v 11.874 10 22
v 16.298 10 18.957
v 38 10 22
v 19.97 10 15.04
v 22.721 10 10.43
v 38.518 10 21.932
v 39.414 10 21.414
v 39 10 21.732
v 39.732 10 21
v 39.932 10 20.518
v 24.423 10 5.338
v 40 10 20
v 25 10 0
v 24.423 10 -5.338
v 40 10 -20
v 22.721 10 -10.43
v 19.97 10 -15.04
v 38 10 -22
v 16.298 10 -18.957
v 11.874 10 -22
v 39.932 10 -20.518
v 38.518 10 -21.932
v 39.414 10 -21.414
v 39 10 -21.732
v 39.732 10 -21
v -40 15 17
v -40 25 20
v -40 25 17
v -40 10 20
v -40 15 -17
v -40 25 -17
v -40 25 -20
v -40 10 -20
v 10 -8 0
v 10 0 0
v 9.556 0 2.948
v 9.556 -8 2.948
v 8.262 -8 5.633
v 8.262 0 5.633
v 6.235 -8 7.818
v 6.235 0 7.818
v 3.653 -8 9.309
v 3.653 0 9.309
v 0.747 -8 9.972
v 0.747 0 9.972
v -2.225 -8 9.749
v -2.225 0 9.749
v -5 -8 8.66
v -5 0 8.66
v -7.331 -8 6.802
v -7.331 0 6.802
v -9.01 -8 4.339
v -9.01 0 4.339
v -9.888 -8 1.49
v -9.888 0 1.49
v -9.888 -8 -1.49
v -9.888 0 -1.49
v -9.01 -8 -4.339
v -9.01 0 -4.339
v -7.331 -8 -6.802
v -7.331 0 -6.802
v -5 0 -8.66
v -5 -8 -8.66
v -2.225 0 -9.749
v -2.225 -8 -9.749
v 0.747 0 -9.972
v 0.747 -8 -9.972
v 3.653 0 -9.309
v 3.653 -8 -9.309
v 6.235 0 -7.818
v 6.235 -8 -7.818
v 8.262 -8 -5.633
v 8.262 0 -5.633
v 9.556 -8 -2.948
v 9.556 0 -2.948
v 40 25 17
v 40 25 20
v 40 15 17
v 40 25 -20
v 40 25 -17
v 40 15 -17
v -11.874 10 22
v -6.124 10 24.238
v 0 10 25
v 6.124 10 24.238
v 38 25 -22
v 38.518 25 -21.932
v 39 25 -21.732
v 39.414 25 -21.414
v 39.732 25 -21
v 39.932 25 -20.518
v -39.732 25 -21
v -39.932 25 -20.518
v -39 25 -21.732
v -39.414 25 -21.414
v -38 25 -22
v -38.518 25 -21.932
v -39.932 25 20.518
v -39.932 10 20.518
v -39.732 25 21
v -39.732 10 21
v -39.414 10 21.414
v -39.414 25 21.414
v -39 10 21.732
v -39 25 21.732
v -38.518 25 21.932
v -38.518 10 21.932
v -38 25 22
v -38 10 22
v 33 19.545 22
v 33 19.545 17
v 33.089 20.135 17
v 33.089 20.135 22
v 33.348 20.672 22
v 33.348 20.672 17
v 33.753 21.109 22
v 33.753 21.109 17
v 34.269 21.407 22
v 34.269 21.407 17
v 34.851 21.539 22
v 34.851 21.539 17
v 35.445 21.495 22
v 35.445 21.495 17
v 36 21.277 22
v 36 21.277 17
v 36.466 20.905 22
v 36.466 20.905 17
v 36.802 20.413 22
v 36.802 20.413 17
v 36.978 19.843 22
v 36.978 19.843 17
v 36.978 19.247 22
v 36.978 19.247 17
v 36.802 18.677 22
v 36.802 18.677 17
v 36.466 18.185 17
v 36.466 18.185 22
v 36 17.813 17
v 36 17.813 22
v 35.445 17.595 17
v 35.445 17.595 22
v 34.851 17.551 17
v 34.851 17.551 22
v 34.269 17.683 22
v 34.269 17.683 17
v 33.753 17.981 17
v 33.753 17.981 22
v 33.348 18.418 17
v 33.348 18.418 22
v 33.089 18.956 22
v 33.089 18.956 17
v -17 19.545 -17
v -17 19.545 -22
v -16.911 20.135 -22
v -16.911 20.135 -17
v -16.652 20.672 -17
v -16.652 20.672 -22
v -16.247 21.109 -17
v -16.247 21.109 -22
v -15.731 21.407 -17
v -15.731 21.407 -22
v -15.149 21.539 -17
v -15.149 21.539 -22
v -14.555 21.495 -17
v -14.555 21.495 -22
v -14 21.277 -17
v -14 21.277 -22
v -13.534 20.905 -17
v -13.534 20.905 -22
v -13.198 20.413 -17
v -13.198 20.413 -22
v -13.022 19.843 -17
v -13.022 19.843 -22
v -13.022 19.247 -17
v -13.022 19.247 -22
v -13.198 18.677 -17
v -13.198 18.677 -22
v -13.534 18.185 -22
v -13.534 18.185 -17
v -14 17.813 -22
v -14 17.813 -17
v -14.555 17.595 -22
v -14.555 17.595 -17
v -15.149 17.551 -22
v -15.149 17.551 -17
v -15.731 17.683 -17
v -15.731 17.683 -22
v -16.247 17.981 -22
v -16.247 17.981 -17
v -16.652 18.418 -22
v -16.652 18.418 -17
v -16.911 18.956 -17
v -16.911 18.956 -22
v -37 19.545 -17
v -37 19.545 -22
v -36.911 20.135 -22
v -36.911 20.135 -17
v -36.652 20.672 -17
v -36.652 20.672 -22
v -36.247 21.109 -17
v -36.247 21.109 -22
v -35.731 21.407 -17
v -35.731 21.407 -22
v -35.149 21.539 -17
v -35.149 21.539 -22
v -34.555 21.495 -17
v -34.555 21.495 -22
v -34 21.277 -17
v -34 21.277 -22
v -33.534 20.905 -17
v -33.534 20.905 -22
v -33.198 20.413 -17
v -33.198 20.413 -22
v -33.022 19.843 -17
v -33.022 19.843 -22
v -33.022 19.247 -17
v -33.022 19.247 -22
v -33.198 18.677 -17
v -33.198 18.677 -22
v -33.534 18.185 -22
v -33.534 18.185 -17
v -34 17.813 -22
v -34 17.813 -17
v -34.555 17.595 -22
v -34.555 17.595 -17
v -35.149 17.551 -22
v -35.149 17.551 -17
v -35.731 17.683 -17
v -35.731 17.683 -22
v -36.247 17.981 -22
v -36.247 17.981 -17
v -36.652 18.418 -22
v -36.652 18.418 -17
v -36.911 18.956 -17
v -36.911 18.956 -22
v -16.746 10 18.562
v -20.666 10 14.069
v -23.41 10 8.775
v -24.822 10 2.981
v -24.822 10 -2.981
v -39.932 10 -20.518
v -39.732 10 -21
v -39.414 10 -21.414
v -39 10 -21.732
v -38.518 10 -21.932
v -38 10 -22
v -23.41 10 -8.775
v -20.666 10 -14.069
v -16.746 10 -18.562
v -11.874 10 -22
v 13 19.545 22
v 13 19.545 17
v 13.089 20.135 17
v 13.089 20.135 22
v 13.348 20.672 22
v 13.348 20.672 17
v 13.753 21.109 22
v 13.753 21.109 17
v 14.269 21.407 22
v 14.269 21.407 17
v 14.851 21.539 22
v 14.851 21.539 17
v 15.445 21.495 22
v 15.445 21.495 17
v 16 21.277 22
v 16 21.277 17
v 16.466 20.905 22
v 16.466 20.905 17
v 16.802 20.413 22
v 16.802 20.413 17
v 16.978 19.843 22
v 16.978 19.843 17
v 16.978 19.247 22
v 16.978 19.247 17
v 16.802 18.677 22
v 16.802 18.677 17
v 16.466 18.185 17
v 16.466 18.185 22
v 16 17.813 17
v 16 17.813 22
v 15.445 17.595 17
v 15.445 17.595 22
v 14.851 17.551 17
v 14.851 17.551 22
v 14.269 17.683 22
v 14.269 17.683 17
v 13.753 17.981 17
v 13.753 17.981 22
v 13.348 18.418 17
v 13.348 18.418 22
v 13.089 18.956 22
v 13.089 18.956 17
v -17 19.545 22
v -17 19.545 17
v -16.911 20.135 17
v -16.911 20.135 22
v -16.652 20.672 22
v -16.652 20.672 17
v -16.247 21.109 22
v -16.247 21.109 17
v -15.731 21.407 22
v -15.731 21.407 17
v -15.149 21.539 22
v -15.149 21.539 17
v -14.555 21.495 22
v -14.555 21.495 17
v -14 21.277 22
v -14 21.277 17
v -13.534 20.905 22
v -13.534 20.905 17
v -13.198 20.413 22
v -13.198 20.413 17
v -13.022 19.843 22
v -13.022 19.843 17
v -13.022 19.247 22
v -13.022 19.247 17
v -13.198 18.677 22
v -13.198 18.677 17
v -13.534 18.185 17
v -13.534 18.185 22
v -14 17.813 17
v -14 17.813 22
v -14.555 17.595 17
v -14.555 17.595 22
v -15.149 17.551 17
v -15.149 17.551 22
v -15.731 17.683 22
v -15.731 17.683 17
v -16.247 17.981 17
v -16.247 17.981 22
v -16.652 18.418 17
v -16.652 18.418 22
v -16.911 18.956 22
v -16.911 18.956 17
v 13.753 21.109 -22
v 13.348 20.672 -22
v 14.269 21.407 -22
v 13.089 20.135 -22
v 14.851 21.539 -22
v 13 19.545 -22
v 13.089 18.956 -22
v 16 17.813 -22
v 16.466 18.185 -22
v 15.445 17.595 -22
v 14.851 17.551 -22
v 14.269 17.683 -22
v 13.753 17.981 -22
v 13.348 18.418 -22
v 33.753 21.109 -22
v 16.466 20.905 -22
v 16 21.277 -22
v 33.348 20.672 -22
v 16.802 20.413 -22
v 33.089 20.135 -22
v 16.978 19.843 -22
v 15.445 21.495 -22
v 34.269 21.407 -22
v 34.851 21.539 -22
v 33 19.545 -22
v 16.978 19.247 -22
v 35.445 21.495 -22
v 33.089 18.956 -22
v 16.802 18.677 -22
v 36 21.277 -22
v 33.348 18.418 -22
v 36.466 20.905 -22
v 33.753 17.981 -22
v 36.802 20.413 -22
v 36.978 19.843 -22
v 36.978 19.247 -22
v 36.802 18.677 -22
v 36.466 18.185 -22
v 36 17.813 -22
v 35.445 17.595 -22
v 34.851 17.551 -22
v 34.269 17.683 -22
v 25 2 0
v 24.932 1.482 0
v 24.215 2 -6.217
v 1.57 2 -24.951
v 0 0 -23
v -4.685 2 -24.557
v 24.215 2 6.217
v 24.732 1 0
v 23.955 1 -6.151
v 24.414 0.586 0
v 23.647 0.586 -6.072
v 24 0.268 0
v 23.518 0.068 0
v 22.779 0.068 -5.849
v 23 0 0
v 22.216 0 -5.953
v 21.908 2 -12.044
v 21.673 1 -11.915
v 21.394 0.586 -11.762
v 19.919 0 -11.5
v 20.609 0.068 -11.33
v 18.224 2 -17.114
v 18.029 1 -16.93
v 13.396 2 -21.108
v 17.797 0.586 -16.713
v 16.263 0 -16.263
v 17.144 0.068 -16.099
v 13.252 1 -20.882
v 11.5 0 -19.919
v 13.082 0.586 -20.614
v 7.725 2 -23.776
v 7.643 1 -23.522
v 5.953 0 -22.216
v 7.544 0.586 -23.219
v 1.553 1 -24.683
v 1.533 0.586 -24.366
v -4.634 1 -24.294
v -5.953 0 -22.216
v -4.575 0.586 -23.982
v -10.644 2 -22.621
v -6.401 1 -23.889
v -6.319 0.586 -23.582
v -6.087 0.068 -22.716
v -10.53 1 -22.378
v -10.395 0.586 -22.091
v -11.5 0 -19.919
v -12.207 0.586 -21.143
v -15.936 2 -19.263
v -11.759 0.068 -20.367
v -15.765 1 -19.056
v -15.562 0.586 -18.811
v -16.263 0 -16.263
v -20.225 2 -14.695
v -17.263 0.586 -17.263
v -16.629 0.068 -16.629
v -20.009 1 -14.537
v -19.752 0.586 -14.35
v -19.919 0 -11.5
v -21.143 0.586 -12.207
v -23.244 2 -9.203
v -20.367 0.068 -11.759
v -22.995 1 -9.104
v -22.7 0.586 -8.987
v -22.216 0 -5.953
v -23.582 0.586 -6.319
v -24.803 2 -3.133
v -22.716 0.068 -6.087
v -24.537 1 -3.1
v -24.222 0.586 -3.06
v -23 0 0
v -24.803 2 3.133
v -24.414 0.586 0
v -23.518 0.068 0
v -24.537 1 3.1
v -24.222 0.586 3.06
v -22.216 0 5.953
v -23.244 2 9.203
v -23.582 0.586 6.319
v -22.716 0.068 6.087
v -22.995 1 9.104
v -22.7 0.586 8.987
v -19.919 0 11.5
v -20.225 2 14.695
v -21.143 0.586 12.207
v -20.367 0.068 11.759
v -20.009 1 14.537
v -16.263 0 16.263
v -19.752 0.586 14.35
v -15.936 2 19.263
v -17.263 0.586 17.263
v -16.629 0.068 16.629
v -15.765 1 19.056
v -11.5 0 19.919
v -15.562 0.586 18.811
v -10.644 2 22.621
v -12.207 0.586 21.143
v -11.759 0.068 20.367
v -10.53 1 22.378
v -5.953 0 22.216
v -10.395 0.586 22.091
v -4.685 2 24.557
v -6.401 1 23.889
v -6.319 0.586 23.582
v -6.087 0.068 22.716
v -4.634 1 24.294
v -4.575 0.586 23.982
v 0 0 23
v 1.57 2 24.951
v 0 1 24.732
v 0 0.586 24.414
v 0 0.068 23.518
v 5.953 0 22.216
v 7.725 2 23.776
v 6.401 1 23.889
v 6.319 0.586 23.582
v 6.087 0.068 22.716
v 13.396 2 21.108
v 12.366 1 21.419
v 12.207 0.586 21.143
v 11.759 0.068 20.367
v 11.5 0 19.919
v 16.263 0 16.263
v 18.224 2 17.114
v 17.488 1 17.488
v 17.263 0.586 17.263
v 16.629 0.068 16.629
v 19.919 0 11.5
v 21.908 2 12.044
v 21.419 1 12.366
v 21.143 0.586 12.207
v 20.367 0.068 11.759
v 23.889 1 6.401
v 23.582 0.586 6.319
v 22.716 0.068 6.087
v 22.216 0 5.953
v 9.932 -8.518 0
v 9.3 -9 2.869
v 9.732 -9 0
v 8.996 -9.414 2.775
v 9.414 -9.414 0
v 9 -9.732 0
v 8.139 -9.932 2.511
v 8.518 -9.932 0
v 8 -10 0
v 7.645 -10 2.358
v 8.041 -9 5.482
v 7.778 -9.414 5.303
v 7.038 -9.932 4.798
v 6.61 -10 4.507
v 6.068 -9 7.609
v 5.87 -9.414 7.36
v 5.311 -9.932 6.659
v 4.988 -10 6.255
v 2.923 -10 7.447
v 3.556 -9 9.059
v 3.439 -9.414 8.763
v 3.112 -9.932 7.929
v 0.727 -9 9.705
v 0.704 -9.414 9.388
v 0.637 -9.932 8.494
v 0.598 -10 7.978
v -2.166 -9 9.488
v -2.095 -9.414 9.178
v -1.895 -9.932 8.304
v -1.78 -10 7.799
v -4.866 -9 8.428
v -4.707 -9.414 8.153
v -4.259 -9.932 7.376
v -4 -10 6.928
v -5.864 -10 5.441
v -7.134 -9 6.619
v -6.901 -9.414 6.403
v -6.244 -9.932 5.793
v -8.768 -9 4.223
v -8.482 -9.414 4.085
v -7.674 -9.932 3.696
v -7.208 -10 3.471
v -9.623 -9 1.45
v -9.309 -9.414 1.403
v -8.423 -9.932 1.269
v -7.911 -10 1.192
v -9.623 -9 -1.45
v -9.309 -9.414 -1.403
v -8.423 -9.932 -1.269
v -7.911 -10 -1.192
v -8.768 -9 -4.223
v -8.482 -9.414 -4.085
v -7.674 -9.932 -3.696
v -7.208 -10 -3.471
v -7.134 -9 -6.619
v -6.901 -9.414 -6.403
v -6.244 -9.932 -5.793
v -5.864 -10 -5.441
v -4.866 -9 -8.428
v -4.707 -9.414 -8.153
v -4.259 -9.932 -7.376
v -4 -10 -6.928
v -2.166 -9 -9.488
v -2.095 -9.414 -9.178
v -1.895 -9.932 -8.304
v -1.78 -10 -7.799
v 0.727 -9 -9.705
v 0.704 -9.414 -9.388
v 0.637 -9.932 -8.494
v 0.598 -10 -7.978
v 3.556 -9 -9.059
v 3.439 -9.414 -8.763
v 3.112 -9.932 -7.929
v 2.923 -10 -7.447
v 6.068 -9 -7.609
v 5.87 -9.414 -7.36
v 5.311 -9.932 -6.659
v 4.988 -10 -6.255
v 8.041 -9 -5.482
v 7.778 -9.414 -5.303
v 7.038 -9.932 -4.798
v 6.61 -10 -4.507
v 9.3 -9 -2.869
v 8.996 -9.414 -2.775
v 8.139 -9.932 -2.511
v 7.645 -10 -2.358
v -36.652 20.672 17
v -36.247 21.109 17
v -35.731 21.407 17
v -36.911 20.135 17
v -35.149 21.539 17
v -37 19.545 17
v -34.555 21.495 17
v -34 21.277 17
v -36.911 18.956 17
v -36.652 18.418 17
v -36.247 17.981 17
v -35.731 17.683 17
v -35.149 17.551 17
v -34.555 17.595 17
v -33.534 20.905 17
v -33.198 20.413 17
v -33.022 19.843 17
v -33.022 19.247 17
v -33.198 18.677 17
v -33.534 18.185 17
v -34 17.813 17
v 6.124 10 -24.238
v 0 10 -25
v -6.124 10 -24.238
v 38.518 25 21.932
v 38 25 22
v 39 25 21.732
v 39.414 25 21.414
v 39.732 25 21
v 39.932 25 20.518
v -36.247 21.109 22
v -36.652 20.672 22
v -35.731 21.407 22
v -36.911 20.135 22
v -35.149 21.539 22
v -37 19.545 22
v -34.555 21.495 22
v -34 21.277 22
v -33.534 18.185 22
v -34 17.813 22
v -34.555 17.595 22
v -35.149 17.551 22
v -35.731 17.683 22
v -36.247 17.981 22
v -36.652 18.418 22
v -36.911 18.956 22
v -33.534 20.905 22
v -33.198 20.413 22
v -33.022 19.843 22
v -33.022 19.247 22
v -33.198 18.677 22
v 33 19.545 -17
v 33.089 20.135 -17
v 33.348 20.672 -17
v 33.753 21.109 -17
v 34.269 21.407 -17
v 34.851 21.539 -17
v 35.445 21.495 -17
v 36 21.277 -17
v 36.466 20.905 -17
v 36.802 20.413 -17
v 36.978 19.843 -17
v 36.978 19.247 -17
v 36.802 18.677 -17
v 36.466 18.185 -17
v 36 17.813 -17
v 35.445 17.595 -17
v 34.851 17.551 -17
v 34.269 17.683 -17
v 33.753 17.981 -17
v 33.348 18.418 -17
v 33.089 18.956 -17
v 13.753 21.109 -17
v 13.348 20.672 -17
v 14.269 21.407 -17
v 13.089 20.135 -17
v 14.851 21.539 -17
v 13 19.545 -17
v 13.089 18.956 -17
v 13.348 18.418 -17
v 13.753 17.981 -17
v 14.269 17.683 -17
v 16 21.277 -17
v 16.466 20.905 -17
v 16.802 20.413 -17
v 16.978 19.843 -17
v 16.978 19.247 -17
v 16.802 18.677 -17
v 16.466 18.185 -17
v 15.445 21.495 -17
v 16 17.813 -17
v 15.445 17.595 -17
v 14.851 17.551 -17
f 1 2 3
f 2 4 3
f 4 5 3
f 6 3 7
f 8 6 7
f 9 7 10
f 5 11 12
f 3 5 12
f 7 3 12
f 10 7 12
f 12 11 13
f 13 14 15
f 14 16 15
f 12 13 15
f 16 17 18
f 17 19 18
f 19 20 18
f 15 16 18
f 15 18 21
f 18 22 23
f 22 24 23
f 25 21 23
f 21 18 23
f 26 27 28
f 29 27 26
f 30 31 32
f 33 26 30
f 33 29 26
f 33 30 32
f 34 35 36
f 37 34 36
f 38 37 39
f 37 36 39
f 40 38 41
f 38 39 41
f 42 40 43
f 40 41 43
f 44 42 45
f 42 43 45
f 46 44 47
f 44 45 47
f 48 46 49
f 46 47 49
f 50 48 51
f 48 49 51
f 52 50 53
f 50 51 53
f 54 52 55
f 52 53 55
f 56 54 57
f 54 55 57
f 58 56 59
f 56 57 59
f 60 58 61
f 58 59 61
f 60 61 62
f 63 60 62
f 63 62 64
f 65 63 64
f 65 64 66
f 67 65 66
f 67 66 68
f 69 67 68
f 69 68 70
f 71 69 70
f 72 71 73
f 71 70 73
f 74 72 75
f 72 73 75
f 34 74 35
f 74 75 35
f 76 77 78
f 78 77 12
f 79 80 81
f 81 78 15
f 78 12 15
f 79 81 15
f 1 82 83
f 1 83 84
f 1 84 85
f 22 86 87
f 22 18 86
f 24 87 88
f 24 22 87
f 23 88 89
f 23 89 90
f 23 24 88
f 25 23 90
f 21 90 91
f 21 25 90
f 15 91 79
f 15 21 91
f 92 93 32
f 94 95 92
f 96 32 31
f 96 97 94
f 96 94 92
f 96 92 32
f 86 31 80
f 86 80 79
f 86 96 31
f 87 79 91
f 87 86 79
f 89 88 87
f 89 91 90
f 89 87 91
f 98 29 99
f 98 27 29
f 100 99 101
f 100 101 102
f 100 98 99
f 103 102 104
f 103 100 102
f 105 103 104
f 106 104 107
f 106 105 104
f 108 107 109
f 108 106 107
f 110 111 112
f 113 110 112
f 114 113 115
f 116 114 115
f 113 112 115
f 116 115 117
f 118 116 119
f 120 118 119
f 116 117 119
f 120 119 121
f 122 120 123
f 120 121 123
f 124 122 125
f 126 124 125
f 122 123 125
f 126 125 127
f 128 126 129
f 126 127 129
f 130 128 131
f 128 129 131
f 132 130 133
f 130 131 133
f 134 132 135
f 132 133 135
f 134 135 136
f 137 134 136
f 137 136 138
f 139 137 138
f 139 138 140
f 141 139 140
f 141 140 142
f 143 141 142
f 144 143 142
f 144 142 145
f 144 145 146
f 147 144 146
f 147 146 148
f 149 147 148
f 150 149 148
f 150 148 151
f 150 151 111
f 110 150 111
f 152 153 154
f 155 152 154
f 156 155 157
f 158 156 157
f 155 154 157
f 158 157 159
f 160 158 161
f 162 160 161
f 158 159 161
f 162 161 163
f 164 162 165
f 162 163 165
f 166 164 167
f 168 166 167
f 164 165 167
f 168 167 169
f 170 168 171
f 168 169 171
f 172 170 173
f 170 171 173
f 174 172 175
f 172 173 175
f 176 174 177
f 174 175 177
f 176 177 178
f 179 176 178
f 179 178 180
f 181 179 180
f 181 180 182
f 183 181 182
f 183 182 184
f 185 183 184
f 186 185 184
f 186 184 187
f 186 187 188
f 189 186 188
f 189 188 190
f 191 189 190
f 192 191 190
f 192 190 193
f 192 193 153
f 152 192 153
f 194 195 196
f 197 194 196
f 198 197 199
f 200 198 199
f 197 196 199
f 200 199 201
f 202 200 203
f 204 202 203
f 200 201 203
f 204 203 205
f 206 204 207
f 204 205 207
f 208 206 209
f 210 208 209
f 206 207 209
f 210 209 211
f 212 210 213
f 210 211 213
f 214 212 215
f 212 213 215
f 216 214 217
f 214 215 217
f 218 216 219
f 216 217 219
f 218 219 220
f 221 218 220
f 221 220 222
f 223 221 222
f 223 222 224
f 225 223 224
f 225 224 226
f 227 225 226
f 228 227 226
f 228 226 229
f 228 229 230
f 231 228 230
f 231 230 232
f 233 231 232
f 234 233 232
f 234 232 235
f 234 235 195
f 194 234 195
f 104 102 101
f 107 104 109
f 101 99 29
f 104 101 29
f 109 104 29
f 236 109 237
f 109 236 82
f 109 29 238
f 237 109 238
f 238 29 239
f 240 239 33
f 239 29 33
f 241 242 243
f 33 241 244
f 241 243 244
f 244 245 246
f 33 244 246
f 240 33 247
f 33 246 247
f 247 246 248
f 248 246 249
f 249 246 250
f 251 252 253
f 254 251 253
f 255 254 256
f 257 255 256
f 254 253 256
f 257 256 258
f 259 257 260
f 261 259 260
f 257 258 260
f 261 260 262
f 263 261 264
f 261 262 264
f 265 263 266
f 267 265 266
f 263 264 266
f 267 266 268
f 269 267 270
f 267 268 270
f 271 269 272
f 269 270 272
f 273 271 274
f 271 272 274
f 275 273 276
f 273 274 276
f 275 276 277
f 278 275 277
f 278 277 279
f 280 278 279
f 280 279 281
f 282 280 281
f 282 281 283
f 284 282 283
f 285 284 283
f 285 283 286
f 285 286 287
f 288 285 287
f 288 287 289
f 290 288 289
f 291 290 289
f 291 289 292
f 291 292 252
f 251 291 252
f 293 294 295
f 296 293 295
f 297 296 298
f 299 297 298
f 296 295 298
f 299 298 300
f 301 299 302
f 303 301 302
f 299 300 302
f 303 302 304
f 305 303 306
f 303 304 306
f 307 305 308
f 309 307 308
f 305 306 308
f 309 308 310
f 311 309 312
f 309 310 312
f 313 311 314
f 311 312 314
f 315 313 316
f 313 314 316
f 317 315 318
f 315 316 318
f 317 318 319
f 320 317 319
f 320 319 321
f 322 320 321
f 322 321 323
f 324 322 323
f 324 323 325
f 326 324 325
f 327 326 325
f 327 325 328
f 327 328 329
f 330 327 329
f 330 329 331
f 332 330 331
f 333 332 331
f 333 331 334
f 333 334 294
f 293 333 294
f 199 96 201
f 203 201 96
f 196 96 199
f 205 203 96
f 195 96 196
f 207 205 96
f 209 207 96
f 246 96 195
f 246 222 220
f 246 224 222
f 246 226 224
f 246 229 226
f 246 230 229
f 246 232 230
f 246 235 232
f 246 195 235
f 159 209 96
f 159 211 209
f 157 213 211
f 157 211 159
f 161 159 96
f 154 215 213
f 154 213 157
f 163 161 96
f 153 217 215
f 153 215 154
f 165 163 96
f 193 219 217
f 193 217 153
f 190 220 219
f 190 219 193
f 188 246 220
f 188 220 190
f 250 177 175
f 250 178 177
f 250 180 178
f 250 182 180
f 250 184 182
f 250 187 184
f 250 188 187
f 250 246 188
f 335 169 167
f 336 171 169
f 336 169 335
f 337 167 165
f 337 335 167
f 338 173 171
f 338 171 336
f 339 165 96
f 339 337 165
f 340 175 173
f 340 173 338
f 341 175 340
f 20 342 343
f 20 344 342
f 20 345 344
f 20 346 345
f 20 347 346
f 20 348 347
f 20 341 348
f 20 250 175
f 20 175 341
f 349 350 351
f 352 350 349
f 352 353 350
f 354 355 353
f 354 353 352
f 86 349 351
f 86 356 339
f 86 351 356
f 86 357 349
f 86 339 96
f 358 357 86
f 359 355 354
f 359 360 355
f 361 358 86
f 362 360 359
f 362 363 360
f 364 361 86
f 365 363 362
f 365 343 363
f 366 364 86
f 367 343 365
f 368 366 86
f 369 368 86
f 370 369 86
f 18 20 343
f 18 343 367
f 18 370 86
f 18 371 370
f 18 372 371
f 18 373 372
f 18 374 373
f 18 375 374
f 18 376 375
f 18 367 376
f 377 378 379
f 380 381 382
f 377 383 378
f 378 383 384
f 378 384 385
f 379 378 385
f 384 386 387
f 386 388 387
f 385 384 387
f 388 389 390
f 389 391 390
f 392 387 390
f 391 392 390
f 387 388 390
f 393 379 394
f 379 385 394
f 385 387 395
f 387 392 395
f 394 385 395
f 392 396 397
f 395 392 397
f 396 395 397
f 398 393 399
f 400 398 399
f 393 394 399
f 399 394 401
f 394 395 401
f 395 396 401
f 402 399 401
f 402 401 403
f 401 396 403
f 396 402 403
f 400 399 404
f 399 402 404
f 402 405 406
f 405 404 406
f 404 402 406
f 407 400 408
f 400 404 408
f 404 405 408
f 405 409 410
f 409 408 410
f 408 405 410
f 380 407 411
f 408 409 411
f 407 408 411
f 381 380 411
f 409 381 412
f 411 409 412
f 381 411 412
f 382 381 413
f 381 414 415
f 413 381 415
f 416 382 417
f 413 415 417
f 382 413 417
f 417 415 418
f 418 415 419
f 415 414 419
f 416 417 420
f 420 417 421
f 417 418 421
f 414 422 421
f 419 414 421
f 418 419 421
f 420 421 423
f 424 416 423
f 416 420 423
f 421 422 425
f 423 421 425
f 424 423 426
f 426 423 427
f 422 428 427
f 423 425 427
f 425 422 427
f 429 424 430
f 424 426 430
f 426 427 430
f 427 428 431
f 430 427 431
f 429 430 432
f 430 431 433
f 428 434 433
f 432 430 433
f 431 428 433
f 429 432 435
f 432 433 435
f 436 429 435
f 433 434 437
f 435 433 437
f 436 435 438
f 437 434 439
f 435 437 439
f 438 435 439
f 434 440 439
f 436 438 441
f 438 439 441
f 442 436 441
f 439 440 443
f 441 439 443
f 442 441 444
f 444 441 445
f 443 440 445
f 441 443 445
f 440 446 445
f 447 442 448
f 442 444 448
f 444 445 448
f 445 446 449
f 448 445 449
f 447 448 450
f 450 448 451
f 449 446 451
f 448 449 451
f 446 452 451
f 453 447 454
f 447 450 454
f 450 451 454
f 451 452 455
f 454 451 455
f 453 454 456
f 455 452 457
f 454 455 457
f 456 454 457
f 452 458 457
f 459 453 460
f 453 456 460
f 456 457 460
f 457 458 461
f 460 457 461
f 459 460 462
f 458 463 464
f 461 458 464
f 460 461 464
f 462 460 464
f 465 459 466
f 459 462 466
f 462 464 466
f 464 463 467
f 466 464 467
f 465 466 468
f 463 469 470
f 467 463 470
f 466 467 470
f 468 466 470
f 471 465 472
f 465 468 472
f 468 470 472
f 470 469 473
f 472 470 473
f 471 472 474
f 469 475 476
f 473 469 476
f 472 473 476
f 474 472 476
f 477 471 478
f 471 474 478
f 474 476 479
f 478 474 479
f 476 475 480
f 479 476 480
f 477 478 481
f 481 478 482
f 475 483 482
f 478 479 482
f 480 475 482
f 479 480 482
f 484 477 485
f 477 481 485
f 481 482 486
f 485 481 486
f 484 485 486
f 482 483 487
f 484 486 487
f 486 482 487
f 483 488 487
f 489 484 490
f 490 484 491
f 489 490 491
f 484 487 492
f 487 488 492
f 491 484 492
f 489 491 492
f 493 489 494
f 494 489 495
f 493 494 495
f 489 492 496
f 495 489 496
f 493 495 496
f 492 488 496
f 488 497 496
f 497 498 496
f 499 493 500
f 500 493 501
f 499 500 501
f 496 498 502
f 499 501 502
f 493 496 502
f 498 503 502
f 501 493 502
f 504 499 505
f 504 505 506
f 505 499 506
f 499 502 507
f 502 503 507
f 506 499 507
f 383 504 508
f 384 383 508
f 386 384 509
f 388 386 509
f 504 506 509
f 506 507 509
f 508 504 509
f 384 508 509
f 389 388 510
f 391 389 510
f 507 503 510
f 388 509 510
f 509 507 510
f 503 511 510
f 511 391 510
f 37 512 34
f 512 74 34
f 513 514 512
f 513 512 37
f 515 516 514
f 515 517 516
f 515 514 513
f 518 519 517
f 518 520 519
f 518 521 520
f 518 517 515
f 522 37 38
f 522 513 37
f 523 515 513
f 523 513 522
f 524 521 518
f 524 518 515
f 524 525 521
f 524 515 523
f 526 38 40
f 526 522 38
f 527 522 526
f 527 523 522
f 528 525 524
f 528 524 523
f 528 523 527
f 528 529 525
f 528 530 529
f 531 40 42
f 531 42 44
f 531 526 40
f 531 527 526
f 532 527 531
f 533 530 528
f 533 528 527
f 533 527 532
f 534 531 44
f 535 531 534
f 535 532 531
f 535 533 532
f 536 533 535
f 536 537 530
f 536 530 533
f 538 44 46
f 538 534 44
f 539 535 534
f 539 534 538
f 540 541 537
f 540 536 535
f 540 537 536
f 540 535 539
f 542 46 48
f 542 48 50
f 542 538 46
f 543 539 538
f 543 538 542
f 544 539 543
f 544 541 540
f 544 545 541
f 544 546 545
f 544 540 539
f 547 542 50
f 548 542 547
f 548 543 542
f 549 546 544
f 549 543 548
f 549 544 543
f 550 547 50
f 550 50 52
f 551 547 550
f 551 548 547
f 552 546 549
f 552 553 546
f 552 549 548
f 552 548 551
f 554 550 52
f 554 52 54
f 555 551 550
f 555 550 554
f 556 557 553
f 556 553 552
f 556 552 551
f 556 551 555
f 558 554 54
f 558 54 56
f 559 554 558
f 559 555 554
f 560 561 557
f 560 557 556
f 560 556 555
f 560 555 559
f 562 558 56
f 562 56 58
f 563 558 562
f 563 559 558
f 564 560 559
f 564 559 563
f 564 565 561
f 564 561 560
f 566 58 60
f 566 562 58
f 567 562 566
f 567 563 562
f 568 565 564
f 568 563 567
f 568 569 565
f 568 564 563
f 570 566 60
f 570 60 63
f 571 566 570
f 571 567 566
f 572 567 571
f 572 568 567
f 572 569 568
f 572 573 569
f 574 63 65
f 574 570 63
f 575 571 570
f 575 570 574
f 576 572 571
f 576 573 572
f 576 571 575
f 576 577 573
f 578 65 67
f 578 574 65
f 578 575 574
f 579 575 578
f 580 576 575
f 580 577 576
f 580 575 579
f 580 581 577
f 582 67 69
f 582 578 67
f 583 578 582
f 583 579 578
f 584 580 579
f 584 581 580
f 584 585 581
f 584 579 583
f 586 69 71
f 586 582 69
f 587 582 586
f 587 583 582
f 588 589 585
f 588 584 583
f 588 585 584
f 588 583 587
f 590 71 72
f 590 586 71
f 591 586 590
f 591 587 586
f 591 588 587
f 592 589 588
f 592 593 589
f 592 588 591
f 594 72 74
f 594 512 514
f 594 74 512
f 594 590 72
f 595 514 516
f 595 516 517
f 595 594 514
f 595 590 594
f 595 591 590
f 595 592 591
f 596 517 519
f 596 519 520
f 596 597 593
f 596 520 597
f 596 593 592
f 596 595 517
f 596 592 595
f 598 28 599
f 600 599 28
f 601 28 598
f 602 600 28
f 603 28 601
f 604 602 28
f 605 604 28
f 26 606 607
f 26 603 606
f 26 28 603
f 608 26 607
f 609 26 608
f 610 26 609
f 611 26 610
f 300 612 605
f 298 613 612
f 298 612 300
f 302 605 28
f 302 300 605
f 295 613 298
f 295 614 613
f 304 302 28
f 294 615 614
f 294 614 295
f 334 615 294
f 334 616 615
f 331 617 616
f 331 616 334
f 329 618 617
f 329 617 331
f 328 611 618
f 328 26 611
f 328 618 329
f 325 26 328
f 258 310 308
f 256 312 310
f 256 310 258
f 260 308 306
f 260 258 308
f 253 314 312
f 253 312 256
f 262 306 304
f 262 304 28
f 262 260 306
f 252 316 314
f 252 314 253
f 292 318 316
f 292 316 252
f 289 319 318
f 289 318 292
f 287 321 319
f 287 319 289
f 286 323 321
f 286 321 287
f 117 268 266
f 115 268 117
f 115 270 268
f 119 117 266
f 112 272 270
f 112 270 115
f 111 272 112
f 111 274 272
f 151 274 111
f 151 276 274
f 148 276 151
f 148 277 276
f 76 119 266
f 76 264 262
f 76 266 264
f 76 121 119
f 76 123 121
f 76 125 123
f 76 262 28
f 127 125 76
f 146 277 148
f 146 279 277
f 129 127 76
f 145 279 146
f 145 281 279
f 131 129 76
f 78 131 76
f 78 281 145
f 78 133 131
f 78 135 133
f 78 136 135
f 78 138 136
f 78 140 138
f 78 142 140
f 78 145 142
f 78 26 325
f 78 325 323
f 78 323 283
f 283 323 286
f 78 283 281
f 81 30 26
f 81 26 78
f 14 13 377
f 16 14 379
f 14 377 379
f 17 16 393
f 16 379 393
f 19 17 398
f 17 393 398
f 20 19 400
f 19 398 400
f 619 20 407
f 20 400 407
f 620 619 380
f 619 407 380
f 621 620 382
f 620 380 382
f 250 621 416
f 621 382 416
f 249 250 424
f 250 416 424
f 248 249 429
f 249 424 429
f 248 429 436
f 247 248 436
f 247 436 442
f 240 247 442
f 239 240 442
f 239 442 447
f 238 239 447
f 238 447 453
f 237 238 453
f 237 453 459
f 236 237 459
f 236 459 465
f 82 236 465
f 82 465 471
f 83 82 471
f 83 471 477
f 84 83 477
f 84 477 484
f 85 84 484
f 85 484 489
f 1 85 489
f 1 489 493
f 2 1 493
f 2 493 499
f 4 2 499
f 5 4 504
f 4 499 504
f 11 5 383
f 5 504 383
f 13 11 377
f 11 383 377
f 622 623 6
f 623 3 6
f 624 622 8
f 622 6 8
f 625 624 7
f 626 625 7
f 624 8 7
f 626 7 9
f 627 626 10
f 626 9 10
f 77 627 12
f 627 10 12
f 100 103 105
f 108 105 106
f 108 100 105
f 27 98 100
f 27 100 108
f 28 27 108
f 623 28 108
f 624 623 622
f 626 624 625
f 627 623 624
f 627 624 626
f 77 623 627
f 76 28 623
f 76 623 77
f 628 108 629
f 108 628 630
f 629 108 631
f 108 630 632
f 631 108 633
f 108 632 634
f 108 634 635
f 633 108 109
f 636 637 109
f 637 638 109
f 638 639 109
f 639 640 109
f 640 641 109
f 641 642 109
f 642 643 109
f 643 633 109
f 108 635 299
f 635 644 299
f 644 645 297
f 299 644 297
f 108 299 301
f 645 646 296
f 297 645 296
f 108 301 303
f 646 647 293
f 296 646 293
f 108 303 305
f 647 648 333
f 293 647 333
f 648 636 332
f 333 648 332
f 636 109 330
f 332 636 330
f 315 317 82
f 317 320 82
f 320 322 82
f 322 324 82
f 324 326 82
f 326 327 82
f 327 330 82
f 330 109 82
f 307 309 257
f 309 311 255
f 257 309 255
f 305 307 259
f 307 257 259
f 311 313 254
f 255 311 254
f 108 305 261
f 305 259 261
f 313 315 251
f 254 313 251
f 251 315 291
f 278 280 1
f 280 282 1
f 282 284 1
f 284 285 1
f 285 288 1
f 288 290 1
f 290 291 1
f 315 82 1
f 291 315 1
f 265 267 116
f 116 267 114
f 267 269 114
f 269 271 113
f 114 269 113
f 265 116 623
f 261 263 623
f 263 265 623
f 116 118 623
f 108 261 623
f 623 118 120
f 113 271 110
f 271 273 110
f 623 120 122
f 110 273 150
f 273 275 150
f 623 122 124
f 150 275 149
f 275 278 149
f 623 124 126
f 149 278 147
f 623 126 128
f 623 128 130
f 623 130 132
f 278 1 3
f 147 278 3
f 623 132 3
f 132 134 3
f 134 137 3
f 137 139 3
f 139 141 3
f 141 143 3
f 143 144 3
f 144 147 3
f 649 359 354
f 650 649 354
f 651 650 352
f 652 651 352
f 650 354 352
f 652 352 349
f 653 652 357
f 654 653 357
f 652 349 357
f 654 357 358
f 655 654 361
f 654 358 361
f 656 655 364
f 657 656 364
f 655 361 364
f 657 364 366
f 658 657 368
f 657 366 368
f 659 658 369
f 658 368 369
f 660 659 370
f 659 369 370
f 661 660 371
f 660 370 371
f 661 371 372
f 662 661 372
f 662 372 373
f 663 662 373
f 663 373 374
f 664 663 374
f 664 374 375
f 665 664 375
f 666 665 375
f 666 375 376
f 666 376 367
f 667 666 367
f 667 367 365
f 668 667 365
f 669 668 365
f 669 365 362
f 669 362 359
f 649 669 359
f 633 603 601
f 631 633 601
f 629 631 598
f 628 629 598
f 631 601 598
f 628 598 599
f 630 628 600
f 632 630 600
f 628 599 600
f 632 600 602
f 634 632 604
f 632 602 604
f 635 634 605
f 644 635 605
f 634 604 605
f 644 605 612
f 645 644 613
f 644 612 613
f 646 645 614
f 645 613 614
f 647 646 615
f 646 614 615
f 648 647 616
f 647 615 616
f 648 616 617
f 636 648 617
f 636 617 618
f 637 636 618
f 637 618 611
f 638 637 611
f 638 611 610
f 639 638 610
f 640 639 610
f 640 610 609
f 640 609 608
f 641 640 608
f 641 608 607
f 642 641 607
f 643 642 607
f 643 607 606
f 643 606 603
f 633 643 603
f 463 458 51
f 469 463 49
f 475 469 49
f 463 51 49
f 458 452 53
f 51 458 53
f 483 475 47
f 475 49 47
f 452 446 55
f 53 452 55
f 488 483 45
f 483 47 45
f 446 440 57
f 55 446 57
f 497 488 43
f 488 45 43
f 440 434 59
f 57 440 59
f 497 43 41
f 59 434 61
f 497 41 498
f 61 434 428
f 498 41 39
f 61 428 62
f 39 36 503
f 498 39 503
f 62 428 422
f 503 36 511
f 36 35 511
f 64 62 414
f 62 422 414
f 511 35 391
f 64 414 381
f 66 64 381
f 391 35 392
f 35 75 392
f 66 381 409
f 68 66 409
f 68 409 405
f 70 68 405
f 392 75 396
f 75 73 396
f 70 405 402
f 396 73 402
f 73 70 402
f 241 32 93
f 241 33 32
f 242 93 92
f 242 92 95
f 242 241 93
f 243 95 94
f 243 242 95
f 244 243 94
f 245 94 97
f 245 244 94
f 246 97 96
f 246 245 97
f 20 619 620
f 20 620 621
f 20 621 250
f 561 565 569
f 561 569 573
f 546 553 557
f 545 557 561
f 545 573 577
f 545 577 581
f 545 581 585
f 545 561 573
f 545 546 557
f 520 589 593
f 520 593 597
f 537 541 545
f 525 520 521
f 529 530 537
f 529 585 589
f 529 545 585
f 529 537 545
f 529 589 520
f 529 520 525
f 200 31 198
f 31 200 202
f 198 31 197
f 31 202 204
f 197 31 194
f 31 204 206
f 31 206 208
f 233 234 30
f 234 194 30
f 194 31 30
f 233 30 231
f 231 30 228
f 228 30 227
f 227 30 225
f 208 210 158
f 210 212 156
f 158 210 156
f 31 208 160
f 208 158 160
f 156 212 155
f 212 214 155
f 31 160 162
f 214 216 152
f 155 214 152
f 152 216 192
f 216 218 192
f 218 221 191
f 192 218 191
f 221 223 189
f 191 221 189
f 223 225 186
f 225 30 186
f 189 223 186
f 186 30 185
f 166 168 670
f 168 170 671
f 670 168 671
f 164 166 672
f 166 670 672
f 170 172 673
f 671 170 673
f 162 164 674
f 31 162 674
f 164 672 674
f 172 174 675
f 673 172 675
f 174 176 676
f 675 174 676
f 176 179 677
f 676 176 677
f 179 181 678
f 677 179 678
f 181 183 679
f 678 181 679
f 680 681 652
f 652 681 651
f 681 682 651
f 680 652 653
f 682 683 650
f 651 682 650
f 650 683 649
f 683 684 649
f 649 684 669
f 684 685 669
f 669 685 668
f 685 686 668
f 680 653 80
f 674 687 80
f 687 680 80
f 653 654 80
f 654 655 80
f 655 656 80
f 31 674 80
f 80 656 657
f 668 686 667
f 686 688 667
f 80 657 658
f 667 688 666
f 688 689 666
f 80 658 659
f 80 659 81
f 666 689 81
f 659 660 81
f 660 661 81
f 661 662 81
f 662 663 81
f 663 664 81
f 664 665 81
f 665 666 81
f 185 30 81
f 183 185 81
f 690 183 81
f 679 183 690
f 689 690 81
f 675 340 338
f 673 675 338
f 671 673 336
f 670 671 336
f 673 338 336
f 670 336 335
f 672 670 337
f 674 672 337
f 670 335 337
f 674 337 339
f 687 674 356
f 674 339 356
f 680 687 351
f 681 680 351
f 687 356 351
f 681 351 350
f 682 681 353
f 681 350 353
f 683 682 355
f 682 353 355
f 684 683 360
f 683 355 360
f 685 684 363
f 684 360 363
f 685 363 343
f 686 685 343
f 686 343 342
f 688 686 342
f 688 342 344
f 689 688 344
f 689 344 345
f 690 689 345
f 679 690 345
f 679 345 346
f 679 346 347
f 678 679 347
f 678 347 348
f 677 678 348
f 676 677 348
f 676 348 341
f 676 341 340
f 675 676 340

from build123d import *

# Parameters (mm, degrees)
SKETCH_1_R          = 25
EXTRUDE_1_DEPTH     = 10
SKETCH_2_R          = 10
EXTRUDE_2_DEPTH     = 10
FILLET_1_R          = 2
SKETCH_3_W          = 80
SKETCH_3_H          = 44
EXTRUDE_3_DEPTH     = 5
SKETCH_4_W          = 80
SKETCH_4_H          = 5
EXTRUDE_4_DEPTH     = 10
SKETCH_5_R          = 2
CUT_EXTRUDE_1_DEPTH = 81
FILLET_4_R          = 2


with BuildPart() as part:
    # 草圖1 → 填料-伸長1 (new body)
    with BuildSketch(Plane(origin=(0, 0, 0), x_dir=(1, 0, 0), z_dir=(0, 1, 0))):
        Circle(SKETCH_1_R)
    extrude(amount=EXTRUDE_1_DEPTH)

    # 草圖2 → 填料-伸長2 (add)
    with BuildSketch(Plane.XZ):
        Circle(SKETCH_2_R)
    extrude(amount=EXTRUDE_2_DEPTH)

    # 圓角1
    fillet_1_edges = [part.edges().sort_by_distance(p)[0] for p in [
        (-25, 0, 0),
        (-10, -10, 0),
    ]]
    fillet(fillet_1_edges, radius=FILLET_1_R)

    # 草圖3 → 填料-伸長3 (add)
    with BuildSketch(Plane(origin=(0, 10, 0), x_dir=(1, 0, 0), z_dir=(0, 1, 0))):
        Rectangle(SKETCH_3_W, SKETCH_3_H)
    extrude(amount=EXTRUDE_3_DEPTH)

    # 草圖4 → 填料-伸長4 (add)
    with BuildSketch(Plane(origin=(0, 15, 0), x_dir=(1, 0, 0), z_dir=(0, 1, 0))):
        with Locations((0, 19.5)):
            Rectangle(SKETCH_4_W, SKETCH_4_H)
        with Locations((0, -19.5)):
            Rectangle(SKETCH_4_W, SKETCH_4_H)
    extrude(amount=EXTRUDE_4_DEPTH)

    # 草圖5 → 除料-伸長1 (cut)
    with BuildSketch(Plane(origin=(0, 0, -22), x_dir=(-1, 0, 0), z_dir=(0, 0, -1))):
        with Locations((-15, 19.545082089)):
            Circle(SKETCH_5_R)
        with Locations((-35, 19.545082089)):
            Circle(SKETCH_5_R)
        with Locations((15, 19.545082089)):
            Circle(SKETCH_5_R)
        with Locations((35, 19.545082089)):
            Circle(SKETCH_5_R)
    extrude(amount=-CUT_EXTRUDE_1_DEPTH, mode=Mode.SUBTRACT)

    # 圓角4
    fillet_4_edges = [part.edges().sort_by_distance(p)[0] for p in [
        (40, 17.5, 22),
        (40, 17.5, -22),
        (-40, 17.5, -22),
        (-40, 17.5, 22),
    ]]
    fillet(fillet_4_edges, radius=FILLET_4_R)


solid = part.part
